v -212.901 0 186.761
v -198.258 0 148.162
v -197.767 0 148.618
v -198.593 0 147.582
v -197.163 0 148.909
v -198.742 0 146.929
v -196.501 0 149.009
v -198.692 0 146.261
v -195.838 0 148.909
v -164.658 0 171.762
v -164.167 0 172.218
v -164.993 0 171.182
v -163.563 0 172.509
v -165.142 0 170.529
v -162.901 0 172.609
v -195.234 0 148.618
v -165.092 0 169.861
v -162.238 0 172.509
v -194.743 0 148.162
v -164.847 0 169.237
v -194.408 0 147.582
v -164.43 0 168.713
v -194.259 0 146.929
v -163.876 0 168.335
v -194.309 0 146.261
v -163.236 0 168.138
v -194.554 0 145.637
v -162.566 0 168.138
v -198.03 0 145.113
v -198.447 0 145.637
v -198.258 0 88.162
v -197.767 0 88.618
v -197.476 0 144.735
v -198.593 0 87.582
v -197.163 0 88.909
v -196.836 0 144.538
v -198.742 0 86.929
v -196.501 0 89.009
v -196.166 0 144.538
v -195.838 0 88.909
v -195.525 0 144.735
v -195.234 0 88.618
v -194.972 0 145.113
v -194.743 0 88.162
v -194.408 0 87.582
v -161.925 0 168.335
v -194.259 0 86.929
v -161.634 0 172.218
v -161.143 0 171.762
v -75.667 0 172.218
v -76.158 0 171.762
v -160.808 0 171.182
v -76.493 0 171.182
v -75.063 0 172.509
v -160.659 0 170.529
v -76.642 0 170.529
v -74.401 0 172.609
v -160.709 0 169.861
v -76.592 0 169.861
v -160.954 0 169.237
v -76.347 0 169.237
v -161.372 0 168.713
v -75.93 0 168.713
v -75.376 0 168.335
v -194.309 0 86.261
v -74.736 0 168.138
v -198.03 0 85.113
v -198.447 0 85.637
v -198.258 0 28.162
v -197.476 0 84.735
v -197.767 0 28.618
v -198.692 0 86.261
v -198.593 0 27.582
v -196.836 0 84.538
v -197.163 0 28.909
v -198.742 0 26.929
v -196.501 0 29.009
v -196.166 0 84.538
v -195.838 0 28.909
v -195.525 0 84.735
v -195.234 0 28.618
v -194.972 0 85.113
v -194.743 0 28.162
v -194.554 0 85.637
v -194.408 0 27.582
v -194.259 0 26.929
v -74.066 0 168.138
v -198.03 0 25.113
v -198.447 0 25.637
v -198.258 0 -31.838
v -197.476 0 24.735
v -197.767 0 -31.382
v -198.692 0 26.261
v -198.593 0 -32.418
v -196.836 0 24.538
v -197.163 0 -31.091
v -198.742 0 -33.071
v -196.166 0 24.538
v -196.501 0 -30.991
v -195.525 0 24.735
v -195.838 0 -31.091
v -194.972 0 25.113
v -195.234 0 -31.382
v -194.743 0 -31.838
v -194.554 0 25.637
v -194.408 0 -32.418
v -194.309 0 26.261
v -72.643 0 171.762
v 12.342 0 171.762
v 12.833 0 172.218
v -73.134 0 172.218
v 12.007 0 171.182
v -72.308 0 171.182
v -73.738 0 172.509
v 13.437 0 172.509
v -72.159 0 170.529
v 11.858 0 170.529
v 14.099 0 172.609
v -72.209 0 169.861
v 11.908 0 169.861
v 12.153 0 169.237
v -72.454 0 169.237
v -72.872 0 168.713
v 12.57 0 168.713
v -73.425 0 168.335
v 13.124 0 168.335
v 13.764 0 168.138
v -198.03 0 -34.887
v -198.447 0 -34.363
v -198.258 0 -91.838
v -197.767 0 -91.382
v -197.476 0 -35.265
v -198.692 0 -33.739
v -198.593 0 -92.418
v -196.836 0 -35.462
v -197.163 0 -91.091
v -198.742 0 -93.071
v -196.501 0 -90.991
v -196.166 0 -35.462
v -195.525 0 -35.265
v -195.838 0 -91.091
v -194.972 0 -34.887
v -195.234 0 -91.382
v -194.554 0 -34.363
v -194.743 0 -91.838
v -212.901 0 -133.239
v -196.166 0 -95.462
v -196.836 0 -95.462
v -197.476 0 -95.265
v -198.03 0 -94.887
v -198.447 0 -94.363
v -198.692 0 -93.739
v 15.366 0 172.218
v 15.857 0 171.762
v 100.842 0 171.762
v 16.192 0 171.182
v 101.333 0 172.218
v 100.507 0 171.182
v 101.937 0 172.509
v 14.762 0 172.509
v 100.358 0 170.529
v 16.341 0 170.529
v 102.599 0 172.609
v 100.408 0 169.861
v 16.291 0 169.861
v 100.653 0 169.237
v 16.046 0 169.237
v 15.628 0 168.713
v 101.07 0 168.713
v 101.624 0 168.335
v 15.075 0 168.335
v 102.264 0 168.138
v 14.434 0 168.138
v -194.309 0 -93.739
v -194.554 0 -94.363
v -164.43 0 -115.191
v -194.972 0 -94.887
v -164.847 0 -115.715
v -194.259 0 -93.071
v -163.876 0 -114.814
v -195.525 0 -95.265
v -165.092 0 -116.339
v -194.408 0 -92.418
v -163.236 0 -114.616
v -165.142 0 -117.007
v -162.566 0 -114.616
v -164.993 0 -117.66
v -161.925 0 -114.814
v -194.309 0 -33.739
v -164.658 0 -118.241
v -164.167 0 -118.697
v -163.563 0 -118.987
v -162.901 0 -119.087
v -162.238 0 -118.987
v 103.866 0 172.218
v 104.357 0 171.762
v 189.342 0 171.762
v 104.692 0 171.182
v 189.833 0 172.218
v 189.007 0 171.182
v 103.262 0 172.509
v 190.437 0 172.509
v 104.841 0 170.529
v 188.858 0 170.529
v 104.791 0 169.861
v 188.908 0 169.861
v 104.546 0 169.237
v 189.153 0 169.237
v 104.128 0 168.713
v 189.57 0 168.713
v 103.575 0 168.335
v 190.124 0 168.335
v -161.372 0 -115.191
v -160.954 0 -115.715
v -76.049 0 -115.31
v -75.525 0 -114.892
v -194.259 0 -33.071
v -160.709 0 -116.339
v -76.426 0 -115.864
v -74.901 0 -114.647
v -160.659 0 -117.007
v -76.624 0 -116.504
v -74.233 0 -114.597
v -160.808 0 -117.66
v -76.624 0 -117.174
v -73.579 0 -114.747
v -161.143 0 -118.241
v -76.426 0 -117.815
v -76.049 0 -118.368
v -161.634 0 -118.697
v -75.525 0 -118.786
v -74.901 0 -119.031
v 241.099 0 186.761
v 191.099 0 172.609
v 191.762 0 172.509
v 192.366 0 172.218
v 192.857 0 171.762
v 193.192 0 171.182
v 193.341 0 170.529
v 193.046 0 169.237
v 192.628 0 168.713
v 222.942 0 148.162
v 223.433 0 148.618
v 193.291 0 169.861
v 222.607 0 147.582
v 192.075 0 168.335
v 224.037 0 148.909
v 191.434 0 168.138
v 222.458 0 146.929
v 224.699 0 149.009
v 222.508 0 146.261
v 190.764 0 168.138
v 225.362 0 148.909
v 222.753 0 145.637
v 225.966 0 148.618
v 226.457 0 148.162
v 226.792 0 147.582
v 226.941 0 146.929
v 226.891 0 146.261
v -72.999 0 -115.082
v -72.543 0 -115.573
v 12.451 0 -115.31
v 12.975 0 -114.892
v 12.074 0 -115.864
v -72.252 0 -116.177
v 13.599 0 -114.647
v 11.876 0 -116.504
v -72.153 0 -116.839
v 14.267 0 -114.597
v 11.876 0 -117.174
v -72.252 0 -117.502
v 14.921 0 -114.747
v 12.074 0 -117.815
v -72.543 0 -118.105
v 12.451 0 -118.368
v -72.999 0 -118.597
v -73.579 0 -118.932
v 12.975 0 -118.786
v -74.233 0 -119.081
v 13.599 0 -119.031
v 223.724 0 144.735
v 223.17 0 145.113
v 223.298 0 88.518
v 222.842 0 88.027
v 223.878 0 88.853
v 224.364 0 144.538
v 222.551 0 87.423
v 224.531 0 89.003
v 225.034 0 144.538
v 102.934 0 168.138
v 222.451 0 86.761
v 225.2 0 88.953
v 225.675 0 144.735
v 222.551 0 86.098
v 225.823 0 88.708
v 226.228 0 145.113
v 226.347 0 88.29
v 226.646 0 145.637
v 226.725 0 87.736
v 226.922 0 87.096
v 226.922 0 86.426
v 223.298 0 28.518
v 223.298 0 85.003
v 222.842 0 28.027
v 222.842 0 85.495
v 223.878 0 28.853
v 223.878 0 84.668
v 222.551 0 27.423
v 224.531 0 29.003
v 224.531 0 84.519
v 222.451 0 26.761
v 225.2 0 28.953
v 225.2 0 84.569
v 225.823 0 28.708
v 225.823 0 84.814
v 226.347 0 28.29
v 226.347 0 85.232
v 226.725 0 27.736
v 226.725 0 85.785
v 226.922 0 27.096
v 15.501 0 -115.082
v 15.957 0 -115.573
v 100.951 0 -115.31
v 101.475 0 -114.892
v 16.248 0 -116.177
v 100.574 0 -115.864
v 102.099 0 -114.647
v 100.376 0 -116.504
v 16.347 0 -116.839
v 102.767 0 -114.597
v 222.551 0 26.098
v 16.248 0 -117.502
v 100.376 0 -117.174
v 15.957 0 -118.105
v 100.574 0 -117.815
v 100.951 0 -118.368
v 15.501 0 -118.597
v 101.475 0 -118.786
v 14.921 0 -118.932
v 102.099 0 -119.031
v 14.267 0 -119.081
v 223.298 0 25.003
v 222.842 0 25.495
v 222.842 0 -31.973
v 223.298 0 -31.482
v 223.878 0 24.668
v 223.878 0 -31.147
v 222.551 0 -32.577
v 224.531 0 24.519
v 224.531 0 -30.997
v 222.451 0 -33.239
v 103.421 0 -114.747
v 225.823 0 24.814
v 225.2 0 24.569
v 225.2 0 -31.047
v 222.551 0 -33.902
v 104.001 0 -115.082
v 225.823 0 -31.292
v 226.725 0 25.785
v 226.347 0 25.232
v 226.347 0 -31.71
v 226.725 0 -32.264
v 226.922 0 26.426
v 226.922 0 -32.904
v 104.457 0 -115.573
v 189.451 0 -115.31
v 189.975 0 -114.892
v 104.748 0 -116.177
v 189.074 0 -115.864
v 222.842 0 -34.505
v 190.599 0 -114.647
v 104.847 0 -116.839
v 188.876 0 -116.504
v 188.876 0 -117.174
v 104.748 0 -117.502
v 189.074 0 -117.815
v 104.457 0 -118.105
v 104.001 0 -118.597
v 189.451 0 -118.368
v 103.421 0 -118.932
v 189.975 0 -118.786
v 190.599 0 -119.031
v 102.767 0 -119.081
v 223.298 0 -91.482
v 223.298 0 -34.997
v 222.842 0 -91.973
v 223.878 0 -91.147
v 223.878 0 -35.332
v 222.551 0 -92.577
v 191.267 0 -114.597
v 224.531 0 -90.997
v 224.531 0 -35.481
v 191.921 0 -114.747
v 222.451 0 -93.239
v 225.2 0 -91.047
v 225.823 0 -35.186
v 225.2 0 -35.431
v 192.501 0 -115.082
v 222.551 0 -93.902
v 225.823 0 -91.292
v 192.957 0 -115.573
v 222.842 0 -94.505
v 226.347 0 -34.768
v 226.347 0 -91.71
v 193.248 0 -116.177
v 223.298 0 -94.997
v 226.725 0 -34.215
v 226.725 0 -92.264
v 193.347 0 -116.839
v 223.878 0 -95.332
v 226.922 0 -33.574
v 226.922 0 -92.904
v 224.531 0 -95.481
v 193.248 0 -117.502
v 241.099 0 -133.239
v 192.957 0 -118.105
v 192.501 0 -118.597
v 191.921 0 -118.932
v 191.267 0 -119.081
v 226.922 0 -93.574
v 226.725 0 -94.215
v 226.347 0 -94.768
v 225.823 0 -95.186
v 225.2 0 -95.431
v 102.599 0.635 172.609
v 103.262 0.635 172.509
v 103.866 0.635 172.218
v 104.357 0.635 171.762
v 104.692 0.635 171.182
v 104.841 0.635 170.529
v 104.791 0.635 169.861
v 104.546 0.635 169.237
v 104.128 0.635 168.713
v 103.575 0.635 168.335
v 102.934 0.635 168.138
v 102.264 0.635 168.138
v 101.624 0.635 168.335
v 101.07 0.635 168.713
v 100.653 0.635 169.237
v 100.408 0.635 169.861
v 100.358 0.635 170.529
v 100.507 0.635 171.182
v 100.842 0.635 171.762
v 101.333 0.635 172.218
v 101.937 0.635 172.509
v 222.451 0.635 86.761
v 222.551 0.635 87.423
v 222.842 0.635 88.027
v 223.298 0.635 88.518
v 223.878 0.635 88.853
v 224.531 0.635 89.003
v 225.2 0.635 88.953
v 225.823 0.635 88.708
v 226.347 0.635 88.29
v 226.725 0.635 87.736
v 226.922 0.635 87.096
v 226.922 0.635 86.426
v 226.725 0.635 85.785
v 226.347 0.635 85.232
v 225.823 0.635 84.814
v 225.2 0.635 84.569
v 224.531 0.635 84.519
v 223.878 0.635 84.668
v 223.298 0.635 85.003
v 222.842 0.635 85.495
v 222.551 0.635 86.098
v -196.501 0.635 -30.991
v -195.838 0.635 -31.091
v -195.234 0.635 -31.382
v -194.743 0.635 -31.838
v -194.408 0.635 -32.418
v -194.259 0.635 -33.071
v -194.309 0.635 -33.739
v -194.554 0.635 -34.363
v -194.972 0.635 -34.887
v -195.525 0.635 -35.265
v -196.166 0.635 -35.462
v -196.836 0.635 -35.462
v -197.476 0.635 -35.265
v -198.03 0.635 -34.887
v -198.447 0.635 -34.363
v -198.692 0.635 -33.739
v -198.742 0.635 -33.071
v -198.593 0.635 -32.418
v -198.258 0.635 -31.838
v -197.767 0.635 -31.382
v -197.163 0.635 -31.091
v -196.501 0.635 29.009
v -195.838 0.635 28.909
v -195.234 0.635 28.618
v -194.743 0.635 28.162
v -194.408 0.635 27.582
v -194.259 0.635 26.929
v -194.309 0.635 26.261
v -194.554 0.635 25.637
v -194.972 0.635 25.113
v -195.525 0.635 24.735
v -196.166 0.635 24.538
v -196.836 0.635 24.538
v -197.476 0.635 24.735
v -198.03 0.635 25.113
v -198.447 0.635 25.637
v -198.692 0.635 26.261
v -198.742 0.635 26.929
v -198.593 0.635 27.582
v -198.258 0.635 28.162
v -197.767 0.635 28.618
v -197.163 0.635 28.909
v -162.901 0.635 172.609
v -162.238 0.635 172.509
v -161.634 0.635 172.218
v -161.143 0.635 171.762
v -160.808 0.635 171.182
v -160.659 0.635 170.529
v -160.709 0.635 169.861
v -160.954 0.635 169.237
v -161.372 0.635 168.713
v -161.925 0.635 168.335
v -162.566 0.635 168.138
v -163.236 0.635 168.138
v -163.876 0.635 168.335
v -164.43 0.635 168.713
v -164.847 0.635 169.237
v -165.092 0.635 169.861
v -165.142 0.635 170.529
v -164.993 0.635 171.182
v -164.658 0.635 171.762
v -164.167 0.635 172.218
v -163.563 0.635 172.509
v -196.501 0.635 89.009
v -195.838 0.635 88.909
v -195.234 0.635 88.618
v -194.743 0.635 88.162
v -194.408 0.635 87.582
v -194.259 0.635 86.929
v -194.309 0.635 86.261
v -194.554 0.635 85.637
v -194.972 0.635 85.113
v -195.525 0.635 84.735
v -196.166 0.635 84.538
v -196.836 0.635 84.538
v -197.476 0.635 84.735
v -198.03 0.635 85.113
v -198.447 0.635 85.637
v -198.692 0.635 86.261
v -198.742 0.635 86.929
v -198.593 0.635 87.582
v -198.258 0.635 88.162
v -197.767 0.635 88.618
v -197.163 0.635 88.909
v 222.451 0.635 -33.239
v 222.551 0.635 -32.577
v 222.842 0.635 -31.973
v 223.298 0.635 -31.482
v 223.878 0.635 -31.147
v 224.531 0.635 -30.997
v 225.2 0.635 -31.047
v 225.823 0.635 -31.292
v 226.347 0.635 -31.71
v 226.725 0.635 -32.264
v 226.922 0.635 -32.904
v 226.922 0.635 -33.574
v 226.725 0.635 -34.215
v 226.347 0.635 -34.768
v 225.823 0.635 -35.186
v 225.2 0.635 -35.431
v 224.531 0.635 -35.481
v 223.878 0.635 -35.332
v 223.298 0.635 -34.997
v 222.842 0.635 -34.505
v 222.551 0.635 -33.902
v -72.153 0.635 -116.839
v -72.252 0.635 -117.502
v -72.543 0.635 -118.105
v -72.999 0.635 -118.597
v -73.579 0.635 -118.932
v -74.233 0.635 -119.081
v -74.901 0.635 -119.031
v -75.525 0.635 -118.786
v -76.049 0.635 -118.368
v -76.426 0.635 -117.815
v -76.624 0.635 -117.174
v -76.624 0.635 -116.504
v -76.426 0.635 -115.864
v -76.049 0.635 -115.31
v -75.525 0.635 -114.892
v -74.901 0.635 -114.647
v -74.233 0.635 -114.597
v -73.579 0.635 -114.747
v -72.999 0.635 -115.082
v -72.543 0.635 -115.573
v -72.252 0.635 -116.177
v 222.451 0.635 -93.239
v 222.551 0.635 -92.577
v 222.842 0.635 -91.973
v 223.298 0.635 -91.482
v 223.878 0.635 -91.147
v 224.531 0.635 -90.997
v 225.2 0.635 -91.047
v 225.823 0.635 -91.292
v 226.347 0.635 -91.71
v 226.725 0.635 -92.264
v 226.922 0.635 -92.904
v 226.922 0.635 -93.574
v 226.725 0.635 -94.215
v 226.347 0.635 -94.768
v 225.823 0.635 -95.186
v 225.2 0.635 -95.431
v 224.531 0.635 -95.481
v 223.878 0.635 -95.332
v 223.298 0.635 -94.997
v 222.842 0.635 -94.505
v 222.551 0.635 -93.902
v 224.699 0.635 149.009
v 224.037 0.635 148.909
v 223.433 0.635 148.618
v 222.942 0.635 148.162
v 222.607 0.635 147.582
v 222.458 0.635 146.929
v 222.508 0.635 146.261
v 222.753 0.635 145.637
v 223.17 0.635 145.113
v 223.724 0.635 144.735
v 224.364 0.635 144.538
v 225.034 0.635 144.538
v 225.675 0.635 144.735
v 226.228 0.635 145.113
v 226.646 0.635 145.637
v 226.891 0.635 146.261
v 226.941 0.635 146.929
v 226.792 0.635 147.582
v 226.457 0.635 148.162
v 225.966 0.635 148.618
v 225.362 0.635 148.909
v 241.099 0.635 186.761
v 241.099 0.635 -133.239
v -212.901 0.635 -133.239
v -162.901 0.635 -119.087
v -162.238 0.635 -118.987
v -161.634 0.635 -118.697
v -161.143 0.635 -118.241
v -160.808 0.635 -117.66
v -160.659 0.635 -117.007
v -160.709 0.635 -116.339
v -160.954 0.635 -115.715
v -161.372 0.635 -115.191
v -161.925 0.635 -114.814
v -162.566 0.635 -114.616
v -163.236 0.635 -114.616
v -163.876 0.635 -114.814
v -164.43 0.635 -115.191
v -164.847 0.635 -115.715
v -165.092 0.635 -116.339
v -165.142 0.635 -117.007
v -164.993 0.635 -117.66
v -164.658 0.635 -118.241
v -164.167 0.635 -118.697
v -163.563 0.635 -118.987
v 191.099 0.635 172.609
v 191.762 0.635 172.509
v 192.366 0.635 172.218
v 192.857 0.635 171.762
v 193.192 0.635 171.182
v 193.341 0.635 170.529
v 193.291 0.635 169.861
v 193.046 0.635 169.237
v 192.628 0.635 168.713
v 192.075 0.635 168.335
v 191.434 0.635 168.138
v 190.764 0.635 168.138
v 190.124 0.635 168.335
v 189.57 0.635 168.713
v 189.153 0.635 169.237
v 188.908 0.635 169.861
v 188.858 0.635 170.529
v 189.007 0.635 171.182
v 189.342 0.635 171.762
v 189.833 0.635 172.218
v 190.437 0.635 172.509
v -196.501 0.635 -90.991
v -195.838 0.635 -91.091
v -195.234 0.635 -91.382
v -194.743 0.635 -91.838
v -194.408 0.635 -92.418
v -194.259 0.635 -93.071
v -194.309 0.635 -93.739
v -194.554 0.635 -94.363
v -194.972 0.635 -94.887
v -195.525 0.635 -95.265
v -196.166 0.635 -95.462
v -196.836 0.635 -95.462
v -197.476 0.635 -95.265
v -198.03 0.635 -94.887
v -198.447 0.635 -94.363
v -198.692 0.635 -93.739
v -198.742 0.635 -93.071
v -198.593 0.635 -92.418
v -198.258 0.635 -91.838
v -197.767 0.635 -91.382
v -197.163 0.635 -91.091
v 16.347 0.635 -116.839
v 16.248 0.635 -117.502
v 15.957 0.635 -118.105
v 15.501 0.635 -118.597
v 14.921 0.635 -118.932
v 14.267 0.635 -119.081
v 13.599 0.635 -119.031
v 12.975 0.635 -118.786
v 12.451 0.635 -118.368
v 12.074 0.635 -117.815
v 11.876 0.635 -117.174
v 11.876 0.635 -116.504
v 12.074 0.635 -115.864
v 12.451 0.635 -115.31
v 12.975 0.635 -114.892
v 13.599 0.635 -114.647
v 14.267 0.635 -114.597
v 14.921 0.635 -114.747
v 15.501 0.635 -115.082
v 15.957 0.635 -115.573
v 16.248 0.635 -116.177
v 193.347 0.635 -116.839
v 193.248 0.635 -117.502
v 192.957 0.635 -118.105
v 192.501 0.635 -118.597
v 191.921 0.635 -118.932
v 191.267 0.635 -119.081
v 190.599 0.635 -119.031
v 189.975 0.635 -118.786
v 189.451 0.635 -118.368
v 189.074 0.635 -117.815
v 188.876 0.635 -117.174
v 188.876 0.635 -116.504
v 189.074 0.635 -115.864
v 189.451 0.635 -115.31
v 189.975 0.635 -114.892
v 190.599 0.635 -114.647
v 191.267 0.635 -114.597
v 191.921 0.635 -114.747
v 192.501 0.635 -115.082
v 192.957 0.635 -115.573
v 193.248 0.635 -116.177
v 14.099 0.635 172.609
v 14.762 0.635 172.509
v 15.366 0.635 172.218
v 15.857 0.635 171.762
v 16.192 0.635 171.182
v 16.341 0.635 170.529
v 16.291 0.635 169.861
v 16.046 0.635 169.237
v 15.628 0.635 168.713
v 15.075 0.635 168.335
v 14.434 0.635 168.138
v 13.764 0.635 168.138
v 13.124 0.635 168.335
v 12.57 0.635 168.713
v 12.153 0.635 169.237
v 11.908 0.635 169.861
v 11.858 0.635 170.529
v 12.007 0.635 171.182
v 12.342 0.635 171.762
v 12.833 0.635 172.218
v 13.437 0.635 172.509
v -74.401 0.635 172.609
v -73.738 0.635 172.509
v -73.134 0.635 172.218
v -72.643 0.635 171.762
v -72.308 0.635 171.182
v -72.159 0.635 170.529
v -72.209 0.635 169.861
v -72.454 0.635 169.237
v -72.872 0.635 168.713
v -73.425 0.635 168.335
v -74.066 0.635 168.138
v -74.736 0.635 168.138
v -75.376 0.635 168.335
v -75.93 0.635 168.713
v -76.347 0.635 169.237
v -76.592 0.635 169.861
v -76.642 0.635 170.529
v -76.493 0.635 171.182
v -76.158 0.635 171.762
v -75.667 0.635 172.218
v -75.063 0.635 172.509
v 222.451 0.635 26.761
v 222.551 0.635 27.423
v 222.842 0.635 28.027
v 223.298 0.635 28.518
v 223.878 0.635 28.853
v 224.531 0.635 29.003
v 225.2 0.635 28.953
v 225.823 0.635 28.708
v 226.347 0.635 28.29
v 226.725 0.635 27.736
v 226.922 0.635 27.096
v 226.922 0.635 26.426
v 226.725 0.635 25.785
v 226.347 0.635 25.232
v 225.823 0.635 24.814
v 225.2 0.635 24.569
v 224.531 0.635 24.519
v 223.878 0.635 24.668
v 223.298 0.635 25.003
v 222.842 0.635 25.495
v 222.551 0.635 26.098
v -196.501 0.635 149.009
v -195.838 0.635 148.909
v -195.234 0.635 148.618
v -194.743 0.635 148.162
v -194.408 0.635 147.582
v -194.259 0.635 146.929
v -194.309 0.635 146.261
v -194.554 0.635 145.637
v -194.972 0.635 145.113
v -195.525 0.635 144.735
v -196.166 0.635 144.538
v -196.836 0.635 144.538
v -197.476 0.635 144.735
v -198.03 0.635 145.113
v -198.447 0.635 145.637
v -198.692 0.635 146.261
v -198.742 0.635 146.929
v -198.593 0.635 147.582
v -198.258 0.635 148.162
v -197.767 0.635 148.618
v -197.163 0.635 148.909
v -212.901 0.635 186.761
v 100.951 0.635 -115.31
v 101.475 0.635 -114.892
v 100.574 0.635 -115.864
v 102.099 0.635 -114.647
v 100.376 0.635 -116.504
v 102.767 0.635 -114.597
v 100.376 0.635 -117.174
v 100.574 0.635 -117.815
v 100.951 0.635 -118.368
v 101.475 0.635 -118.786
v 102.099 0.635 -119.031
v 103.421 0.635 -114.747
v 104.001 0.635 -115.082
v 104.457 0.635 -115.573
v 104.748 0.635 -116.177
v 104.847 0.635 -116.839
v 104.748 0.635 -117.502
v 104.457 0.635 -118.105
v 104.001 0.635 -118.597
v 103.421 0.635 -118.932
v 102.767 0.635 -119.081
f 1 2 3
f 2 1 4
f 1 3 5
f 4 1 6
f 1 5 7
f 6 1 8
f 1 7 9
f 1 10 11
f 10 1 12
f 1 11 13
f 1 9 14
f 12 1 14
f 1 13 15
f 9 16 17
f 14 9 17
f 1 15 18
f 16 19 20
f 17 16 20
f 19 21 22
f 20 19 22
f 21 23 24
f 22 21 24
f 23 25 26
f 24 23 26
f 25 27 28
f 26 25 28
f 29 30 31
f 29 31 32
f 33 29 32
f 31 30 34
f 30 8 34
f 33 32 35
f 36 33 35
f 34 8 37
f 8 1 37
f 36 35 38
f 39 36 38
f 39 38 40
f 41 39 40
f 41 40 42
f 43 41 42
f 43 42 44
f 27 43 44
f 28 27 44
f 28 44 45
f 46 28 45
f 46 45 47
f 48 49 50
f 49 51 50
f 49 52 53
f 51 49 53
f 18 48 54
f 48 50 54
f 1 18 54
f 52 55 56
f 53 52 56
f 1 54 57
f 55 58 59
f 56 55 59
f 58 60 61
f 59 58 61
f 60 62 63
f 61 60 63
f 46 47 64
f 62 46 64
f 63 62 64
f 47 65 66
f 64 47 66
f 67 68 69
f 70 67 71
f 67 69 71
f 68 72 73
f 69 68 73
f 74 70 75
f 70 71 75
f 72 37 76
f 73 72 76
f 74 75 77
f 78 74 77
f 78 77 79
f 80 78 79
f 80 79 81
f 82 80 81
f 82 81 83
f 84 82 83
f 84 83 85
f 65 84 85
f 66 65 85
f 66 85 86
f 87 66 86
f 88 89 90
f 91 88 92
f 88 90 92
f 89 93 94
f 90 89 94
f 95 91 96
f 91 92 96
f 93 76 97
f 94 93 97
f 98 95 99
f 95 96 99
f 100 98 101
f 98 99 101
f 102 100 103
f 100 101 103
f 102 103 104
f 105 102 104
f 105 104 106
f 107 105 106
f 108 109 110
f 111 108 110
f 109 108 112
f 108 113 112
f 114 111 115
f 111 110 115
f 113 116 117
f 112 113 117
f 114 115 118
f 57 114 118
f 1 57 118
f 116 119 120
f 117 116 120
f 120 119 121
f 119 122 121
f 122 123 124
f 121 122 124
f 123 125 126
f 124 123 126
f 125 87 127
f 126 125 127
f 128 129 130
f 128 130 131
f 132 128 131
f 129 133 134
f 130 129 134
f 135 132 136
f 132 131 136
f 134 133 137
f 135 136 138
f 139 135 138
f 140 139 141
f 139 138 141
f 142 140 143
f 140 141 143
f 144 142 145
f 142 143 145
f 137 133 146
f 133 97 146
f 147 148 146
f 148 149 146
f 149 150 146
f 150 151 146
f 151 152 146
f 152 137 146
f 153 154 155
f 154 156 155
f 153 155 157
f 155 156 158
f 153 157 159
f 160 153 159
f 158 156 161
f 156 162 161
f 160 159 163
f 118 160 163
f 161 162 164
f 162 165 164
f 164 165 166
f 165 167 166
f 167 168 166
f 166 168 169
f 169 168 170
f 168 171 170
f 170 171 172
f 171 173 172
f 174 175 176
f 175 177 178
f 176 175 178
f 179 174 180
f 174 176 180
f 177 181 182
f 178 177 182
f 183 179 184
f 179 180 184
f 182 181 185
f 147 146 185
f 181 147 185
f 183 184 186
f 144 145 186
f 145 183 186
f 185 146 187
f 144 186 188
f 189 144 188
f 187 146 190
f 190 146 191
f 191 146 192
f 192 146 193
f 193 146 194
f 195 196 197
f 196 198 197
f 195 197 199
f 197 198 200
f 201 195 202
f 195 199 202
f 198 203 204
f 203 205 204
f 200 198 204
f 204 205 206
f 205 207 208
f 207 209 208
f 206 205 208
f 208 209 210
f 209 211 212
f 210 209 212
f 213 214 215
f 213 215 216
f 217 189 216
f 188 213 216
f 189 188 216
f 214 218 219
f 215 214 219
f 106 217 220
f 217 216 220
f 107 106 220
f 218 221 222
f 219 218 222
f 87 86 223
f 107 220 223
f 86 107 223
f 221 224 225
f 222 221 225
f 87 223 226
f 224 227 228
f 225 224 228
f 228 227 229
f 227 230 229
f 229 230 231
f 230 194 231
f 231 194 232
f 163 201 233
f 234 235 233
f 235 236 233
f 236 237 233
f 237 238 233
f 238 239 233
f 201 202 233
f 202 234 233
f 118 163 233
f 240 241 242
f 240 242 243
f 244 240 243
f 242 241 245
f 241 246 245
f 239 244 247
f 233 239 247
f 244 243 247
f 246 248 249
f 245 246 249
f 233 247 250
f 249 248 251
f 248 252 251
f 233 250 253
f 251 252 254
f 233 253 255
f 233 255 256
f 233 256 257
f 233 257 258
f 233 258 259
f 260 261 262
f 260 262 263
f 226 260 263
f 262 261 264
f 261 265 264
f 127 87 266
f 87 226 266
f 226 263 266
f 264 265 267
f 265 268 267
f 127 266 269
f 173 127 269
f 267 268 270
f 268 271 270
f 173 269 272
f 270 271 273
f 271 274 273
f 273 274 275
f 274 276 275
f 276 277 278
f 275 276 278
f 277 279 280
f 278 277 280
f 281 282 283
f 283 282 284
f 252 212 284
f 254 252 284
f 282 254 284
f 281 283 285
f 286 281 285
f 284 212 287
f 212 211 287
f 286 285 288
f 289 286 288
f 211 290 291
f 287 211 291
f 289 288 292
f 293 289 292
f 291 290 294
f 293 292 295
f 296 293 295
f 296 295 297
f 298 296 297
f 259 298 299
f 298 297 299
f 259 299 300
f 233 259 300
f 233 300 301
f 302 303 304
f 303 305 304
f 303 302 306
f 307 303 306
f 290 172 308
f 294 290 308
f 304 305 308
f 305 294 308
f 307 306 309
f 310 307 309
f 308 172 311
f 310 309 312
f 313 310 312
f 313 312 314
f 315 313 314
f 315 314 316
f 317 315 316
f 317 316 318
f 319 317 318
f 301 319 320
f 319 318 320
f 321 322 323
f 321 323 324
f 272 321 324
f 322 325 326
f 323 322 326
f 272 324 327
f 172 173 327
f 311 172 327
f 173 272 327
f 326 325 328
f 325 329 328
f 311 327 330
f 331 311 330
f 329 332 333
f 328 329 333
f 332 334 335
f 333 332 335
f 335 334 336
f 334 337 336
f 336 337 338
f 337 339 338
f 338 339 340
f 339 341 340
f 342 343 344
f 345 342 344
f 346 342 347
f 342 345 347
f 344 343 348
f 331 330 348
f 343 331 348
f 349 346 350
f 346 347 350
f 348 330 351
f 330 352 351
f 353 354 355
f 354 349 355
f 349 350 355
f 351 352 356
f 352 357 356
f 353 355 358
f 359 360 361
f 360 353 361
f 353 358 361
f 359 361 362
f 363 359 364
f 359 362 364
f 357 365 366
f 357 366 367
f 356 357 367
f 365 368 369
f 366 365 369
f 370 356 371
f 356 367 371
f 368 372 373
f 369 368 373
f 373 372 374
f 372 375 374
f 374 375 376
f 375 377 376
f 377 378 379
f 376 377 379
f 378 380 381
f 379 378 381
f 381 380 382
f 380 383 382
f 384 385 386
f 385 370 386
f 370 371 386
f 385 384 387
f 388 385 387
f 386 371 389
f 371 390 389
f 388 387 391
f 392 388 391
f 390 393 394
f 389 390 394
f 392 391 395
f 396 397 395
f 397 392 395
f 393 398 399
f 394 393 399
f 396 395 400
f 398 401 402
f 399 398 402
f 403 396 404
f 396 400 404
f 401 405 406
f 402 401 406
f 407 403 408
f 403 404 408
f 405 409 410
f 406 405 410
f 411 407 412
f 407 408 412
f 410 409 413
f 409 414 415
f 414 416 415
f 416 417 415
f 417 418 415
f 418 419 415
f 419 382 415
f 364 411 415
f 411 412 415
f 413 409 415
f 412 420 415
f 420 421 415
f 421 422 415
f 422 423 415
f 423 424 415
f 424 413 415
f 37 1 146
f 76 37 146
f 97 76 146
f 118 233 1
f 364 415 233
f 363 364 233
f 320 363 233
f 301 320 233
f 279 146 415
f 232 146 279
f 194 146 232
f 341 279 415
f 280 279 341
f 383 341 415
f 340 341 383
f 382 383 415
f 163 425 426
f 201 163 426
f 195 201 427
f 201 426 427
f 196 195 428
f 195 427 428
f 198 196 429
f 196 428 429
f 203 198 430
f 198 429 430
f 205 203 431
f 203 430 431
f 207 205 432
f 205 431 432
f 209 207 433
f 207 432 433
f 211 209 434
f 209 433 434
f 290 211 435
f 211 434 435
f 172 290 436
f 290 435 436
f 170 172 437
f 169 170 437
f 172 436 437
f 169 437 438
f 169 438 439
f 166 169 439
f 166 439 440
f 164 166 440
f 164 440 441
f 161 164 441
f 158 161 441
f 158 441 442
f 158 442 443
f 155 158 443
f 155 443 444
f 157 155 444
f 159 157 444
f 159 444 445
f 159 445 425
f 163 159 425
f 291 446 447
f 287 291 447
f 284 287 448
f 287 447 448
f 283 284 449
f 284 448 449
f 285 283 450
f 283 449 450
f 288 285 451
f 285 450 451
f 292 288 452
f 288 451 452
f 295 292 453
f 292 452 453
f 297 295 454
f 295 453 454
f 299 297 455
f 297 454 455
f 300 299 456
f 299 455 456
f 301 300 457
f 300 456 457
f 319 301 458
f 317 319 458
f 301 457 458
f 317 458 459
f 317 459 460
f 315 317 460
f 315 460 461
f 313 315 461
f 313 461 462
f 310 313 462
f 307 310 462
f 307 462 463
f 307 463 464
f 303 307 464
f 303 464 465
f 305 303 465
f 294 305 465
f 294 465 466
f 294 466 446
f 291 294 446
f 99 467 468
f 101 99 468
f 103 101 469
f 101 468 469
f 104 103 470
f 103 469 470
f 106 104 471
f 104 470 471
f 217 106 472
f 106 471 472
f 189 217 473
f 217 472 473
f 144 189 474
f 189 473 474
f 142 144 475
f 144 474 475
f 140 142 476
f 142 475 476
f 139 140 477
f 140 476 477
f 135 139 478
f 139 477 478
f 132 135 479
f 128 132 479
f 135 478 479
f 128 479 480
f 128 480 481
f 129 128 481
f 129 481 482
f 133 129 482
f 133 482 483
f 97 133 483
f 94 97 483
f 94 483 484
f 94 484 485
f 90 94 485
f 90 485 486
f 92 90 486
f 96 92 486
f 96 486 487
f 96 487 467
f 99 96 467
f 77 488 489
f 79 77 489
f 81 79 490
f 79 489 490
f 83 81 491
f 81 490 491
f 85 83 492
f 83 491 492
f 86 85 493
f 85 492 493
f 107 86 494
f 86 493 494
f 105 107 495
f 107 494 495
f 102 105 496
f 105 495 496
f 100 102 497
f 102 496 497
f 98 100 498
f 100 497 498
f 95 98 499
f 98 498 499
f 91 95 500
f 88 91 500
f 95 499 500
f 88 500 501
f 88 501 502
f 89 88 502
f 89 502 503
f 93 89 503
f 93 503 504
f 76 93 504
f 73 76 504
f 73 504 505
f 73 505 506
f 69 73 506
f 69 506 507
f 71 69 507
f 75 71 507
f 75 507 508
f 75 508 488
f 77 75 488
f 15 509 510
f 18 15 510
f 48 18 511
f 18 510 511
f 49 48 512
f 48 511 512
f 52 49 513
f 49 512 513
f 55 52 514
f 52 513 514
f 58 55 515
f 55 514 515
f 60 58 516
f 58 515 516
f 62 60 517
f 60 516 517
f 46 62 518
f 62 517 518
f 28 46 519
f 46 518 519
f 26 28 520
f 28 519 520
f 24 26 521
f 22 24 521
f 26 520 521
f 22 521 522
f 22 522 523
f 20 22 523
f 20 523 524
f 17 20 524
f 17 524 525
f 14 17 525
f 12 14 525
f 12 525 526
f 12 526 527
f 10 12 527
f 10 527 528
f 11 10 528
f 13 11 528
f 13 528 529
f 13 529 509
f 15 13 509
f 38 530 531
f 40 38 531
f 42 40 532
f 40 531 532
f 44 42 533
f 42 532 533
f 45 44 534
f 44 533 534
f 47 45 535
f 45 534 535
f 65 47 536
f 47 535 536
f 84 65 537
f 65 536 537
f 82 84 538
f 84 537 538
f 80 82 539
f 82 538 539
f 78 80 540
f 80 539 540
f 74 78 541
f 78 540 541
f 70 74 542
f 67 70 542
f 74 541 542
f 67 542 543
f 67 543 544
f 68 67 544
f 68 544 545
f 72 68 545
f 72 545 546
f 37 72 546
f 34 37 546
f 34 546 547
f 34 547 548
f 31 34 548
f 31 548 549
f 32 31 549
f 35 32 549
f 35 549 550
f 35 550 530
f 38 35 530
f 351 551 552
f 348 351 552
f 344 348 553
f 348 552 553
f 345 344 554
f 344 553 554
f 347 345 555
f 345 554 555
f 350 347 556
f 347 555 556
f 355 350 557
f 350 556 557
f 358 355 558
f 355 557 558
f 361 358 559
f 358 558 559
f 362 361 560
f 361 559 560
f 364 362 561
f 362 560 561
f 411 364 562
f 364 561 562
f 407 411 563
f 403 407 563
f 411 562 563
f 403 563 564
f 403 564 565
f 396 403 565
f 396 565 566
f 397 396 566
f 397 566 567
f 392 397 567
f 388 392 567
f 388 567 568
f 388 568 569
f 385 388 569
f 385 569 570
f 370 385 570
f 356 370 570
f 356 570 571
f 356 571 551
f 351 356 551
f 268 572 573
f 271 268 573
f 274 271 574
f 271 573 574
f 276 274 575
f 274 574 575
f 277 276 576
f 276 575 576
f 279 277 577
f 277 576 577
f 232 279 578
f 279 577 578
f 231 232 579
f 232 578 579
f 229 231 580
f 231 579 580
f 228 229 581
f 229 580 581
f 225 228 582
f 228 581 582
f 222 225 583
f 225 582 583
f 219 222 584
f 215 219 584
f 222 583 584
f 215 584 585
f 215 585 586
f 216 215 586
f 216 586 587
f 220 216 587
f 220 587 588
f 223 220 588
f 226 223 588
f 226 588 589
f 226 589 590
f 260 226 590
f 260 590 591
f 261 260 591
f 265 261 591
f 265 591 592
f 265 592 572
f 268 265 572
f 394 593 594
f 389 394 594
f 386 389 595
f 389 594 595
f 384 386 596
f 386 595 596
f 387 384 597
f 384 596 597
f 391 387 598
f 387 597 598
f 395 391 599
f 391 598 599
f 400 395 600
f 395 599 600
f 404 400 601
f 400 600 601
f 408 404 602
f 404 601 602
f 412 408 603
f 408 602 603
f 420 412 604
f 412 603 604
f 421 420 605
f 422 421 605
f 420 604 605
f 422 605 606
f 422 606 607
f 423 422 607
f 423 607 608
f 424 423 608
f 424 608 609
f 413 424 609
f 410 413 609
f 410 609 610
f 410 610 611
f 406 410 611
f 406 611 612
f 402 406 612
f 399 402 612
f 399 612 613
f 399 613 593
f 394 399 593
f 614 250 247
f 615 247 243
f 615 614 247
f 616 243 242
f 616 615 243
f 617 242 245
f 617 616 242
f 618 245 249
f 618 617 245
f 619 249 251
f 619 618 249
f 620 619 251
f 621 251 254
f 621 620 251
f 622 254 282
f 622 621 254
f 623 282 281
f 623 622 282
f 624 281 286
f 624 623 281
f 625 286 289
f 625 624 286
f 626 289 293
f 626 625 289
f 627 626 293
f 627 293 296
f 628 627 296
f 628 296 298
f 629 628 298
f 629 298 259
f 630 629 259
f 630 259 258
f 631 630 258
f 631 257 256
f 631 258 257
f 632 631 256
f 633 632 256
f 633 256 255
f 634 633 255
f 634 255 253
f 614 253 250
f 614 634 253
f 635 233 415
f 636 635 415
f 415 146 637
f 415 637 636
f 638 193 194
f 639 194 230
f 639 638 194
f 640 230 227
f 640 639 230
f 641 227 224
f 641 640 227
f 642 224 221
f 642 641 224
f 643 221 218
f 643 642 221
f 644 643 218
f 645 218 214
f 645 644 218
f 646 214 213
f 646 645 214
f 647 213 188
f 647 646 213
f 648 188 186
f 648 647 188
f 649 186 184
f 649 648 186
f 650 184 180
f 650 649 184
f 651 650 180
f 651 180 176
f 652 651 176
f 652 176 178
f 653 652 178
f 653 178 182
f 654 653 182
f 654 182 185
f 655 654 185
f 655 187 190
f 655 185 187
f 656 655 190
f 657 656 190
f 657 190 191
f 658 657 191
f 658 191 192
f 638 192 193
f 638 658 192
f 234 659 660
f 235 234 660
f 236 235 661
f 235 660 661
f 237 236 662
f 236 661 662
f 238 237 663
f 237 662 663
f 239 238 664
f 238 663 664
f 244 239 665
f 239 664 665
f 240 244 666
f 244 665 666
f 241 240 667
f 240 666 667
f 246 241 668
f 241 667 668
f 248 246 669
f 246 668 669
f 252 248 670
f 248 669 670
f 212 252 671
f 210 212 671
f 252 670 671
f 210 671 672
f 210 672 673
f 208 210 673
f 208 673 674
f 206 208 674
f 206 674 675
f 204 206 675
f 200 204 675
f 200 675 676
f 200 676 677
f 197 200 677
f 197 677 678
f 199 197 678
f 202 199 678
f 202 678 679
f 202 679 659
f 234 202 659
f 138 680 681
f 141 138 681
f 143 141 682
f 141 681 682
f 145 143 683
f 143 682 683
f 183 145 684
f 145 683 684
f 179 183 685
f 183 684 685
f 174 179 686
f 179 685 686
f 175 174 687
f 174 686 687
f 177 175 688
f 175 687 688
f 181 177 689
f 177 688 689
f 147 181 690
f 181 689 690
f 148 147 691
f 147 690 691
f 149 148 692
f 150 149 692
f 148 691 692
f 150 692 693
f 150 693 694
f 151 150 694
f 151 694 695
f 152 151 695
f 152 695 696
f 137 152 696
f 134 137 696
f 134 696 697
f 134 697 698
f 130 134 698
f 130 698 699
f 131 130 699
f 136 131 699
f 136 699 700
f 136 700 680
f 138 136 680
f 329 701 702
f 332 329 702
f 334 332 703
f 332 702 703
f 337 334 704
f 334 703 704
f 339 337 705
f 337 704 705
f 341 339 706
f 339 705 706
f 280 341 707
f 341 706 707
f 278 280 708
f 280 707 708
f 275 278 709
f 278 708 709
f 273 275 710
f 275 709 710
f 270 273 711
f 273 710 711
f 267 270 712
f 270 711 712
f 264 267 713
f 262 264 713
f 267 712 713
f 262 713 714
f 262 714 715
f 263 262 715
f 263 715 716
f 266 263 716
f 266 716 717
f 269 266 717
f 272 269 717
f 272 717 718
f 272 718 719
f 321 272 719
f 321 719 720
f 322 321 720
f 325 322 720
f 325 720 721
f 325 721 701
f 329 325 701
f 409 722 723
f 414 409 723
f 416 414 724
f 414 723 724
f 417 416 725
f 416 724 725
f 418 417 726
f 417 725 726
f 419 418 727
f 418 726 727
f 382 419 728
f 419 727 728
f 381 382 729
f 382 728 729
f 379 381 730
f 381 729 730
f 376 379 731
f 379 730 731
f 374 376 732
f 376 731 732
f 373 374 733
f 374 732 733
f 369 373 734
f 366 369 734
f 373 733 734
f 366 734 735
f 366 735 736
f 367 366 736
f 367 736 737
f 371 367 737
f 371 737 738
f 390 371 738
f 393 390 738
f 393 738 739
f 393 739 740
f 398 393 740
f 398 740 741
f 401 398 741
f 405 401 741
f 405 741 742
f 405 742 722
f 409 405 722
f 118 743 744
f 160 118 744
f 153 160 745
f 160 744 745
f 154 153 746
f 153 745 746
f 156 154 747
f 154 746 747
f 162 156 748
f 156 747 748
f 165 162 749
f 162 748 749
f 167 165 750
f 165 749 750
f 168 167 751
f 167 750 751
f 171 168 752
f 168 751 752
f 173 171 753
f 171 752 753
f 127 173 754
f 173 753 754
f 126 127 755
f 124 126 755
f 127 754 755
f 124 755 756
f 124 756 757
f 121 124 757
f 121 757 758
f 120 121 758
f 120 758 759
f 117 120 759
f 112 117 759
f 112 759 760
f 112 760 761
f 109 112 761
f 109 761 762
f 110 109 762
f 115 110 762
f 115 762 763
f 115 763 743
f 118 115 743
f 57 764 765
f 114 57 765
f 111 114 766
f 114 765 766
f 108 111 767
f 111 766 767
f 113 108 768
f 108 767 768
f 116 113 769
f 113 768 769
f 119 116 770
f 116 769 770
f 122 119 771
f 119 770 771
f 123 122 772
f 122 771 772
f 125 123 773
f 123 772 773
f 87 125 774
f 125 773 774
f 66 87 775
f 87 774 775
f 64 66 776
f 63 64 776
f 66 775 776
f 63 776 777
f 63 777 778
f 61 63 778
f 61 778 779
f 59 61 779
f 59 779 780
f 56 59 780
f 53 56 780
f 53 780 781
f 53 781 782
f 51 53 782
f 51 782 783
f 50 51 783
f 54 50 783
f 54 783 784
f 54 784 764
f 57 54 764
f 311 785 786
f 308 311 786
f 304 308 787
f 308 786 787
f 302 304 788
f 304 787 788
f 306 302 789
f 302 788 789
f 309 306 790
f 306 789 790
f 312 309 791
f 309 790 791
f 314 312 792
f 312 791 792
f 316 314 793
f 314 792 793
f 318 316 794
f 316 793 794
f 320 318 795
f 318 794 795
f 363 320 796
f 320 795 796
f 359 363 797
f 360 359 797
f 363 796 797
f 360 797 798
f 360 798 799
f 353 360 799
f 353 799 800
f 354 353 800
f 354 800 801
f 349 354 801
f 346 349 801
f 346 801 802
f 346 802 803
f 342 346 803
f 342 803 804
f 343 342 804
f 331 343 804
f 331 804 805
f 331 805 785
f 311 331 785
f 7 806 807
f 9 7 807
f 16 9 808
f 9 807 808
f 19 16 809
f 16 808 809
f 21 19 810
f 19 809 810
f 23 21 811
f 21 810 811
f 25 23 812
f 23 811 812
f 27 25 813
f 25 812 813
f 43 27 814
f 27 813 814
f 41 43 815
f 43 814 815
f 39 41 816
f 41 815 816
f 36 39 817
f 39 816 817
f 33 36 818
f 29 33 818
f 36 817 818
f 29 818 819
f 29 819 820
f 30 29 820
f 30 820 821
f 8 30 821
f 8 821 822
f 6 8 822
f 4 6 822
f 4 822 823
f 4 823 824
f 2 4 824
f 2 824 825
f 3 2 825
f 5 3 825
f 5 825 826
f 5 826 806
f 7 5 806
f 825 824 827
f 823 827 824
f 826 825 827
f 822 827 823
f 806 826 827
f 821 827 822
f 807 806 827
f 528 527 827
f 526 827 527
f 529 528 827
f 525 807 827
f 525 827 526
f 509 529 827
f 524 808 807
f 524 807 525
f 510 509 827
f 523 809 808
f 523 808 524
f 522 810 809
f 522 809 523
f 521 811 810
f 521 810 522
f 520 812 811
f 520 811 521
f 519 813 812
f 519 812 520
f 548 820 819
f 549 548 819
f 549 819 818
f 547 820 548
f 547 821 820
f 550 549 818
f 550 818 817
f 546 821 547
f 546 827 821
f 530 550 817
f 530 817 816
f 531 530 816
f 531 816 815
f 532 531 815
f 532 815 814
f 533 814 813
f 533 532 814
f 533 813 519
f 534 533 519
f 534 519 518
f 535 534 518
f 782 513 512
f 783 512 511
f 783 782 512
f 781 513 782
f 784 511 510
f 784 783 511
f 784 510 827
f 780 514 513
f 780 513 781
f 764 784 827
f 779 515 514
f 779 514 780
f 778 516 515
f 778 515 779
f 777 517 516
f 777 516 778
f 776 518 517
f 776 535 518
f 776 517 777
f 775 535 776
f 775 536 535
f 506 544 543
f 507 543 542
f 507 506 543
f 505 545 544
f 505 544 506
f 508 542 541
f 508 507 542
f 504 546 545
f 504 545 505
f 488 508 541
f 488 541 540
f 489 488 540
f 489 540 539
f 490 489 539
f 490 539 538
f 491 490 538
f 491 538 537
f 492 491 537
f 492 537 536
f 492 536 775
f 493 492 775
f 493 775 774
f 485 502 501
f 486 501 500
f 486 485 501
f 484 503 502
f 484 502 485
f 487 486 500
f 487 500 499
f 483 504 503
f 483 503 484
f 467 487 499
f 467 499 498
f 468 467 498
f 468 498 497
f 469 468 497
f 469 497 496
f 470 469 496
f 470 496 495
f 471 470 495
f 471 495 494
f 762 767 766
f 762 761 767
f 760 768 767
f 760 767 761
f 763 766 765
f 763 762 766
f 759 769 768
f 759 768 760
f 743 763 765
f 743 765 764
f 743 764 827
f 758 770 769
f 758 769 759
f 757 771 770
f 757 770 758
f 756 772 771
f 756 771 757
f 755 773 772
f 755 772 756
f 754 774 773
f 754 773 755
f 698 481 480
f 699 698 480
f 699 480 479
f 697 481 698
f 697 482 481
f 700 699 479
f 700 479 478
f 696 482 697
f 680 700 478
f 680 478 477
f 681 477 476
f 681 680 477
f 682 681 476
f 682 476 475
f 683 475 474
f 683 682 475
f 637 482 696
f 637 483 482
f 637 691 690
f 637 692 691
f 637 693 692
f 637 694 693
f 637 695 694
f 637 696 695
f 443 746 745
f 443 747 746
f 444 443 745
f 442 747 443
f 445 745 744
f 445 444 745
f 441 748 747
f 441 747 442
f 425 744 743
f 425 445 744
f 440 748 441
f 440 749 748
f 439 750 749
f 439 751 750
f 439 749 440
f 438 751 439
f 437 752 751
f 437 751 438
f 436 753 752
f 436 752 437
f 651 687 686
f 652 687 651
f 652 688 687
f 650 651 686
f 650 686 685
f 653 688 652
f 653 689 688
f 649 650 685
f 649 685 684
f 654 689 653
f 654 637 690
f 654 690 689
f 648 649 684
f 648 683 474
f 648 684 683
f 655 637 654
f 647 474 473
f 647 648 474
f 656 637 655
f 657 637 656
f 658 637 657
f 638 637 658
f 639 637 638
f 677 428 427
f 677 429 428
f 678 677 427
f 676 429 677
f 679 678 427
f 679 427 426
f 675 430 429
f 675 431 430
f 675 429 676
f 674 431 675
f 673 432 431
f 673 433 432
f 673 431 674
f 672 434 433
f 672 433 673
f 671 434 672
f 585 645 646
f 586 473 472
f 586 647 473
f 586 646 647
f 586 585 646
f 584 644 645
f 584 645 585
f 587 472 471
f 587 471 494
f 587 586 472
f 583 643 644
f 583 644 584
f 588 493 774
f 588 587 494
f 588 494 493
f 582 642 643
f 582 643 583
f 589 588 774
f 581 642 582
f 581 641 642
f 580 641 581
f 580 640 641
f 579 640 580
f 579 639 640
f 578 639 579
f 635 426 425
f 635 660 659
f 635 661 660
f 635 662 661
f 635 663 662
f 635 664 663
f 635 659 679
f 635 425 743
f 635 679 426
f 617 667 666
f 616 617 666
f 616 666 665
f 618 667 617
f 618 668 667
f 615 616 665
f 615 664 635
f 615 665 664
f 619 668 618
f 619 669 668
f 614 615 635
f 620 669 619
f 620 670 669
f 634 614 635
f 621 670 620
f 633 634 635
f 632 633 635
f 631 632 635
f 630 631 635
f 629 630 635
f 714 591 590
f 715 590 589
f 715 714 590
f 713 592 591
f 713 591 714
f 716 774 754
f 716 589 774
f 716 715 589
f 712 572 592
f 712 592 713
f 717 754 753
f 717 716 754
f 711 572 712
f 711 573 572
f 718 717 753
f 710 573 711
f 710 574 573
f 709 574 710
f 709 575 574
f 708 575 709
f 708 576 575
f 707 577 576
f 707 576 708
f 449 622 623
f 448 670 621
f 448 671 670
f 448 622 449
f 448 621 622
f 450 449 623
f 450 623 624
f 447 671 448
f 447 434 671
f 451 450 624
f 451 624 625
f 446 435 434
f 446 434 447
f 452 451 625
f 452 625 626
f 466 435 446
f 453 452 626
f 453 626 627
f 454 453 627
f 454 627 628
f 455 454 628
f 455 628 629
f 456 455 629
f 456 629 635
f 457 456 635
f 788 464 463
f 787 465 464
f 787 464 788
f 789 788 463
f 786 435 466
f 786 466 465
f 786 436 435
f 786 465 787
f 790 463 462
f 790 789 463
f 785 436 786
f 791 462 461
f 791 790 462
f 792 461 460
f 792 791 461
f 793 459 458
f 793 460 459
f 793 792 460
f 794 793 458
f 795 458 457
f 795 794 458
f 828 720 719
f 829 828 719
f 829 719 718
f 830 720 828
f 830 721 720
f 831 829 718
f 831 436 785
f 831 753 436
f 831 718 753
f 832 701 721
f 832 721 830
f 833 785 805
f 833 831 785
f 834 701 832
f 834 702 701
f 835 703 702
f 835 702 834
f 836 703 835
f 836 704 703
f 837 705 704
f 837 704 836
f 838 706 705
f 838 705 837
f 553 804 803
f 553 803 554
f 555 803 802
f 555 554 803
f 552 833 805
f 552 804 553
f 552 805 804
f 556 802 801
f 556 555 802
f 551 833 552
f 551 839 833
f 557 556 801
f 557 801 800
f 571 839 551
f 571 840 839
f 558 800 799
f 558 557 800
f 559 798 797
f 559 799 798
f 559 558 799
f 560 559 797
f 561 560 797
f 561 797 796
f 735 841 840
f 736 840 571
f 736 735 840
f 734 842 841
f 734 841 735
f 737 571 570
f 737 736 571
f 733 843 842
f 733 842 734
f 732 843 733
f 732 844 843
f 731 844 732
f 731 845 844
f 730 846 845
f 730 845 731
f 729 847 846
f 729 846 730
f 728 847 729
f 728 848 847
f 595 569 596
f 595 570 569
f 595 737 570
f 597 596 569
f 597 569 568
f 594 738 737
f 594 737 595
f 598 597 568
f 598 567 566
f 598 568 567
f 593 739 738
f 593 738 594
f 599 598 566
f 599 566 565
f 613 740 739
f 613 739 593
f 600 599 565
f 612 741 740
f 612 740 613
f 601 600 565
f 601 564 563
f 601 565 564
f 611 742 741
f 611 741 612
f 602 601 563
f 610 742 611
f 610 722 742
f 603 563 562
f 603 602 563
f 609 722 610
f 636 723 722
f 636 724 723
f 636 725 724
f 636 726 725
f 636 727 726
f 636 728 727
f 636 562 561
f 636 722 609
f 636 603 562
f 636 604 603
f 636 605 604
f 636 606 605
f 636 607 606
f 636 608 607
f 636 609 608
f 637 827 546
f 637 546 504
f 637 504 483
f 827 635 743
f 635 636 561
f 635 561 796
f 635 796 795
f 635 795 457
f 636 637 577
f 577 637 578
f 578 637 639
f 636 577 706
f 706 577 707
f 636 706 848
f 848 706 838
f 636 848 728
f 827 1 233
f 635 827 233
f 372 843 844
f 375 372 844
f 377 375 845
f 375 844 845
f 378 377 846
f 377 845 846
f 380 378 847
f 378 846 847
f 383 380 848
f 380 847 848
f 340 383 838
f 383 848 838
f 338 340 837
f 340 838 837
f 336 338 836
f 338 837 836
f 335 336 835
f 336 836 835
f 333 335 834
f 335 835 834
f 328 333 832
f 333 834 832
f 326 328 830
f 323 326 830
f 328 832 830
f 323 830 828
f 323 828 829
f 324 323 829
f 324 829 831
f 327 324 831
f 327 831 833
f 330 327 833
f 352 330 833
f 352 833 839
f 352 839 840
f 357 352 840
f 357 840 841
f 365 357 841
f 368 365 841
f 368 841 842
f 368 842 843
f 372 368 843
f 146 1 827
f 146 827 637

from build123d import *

# Parameters (mm, degrees)
SKETCH1_W               = 454
SKETCH1_H               = 320
BOSS_EXTRUDE1_DEPTH     = 0.635
SKETCH2_R               = 2.248
CUT_EXTRUDE2_DEPTH      = 305.973664639
LPATTERN1_COUNT         = 5
LPATTERN1_PITCH         = 88.5
MIRROR1_COPY_1_SKETCH_R = 2.248
MIRROR1_COPY_1_DEPTH    = 305.973664639
MIRROR1_COPY_2_SKETCH_R = 2.248
MIRROR1_COPY_2_DEPTH    = 305.973664639
MIRROR1_COPY_3_SKETCH_R = 2.248
MIRROR1_COPY_3_DEPTH    = 305.973664639
MIRROR1_COPY_4_SKETCH_R = 2.248
MIRROR1_COPY_4_DEPTH    = 305.973664639
SKETCH3_R               = 2.248
CUT_EXTRUDE3_DEPTH      = 10
LPATTERN2_COUNT         = 5
LPATTERN2_PITCH         = 60
MIRROR2_COPY_1_SKETCH_R = 2.248
MIRROR2_COPY_1_DEPTH    = 10
MIRROR2_COPY_2_SKETCH_R = 2.248
MIRROR2_COPY_2_DEPTH    = 10
MIRROR2_COPY_3_SKETCH_R = 2.248
MIRROR2_COPY_3_DEPTH    = 10
MIRROR2_COPY_4_SKETCH_R = 2.248
MIRROR2_COPY_4_DEPTH    = 10


with BuildPart() as part:
    # Sketch1 → Boss-Extrude1 (new body)
    with BuildSketch(Plane(origin=(0, 0, 0), x_dir=(1, 0, 0), z_dir=(0, 1, 0))):
        with Locations((14.099378882, -26.760869565)):
            Rectangle(SKETCH1_W, SKETCH1_H)
    extrude(amount=BOSS_EXTRUDE1_DEPTH)

    # Sketch2 → Cut-Extrude2 (cut, through all)
    with BuildSketch(Plane(origin=(0, 0.635, 0), x_dir=(1, 0, 0), z_dir=(0, 1, 0))):
        with Locations(Location((-162.900621118, -170.360869565, 0), (0, 0, 270))):
            Circle(SKETCH2_R)
    cut_extrude2 = extrude(amount=-CUT_EXTRUDE2_DEPTH, mode=Mode.SUBTRACT)

    # LPattern1: Cut-Extrude2 ×5
    with Locations(*[(i * LPATTERN1_PITCH, 0, 0) for i in range(1, LPATTERN1_COUNT)]):
        add(cut_extrude2, mode=Mode.SUBTRACT)

    # Mirror1: Cut-Extrude2 across plane
    add(cut_extrude2.mirror(Plane(origin=(0, 0, 26.760869565), x_dir=(1, 0, 0), z_dir=(0, 0, -1))), mode=Mode.SUBTRACT)

    # Mirror1 copy 1 sketch → Mirror1 copy 1 (cut, through all)
    with BuildSketch(Plane(origin=(88.5, 0.635, 53.52173913), x_dir=(1, 0, 0), z_dir=(0, 1, 0))):
        with Locations((-162.900621118, 170.360869565)):
            Circle(MIRROR1_COPY_1_SKETCH_R)
    extrude(amount=-MIRROR1_COPY_1_DEPTH, mode=Mode.SUBTRACT)

    # Mirror1 copy 2 sketch → Mirror1 copy 2 (cut, through all)
    with BuildSketch(Plane(origin=(177, 0.635, 53.52173913), x_dir=(1, 0, 0), z_dir=(0, 1, 0))):
        with Locations((-162.900621118, 170.360869565)):
            Circle(MIRROR1_COPY_2_SKETCH_R)
    extrude(amount=-MIRROR1_COPY_2_DEPTH, mode=Mode.SUBTRACT)

    # Mirror1 copy 3 sketch → Mirror1 copy 3 (cut, through all)
    with BuildSketch(Plane(origin=(265.5, 0.635, 53.52173913), x_dir=(1, 0, 0), z_dir=(0, 1, 0))):
        with Locations((-162.900621118, 170.360869565)):
            Circle(MIRROR1_COPY_3_SKETCH_R)
    extrude(amount=-MIRROR1_COPY_3_DEPTH, mode=Mode.SUBTRACT)

    # Mirror1 copy 4 sketch → Mirror1 copy 4 (cut, through all)
    with BuildSketch(Plane(origin=(354, 0.635, 53.52173913), x_dir=(1, 0, 0), z_dir=(0, 1, 0))):
        with Locations((-162.900621118, 170.360869565)):
            Circle(MIRROR1_COPY_4_SKETCH_R)
    extrude(amount=-MIRROR1_COPY_4_DEPTH, mode=Mode.SUBTRACT)

    # Sketch3 → Cut-Extrude3 (cut)
    with BuildSketch(Plane(origin=(0, 0.635, 0), x_dir=(1, 0, 0), z_dir=(0, 1, 0))):
        with Locations(Location((-196.500621118, -146.760869565, 0), (0, 0, 270))):
            Circle(SKETCH3_R)
    cut_extrude3 = extrude(amount=-CUT_EXTRUDE3_DEPTH, mode=Mode.SUBTRACT)

    # LPattern2: Cut-Extrude3 ×5
    with Locations(*[(0, 0, -i * LPATTERN2_PITCH) for i in range(1, LPATTERN2_COUNT)]):
        add(cut_extrude3, mode=Mode.SUBTRACT)

    # Mirror2: Cut-Extrude3 across plane
    add(cut_extrude3.mirror(Plane.ZY.offset(-14.099378882)), mode=Mode.SUBTRACT)

    # Mirror2 copy 1 sketch → Mirror2 copy 1 (cut)
    with BuildSketch(Plane(origin=(28.198757764, 0.635, -60), x_dir=(-1, 0, 0), z_dir=(0, 1, 0))):
        with Locations((-196.500621118, 146.760869565)):
            Circle(MIRROR2_COPY_1_SKETCH_R)
    extrude(amount=-MIRROR2_COPY_1_DEPTH, mode=Mode.SUBTRACT)

    # Mirror2 copy 2 sketch → Mirror2 copy 2 (cut)
    with BuildSketch(Plane(origin=(28.198757764, 0.635, -120), x_dir=(-1, 0, 0), z_dir=(0, 1, 0))):
        with Locations((-196.500621118, 146.760869565)):
            Circle(MIRROR2_COPY_2_SKETCH_R)
    extrude(amount=-MIRROR2_COPY_2_DEPTH, mode=Mode.SUBTRACT)

    # Mirror2 copy 3 sketch → Mirror2 copy 3 (cut)
    with BuildSketch(Plane(origin=(28.198757764, 0.635, -180), x_dir=(-1, 0, 0), z_dir=(0, 1, 0))):
        with Locations((-196.500621118, 146.760869565)):
            Circle(MIRROR2_COPY_3_SKETCH_R)
    extrude(amount=-MIRROR2_COPY_3_DEPTH, mode=Mode.SUBTRACT)

    # Mirror2 copy 4 sketch → Mirror2 copy 4 (cut)
    with BuildSketch(Plane(origin=(28.198757764, 0.635, -240), x_dir=(-1, 0, 0), z_dir=(0, 1, 0))):
        with Locations((-196.500621118, 146.760869565)):
            Circle(MIRROR2_COPY_4_SKETCH_R)
    extrude(amount=-MIRROR2_COPY_4_DEPTH, mode=Mode.SUBTRACT)


solid = part.part
